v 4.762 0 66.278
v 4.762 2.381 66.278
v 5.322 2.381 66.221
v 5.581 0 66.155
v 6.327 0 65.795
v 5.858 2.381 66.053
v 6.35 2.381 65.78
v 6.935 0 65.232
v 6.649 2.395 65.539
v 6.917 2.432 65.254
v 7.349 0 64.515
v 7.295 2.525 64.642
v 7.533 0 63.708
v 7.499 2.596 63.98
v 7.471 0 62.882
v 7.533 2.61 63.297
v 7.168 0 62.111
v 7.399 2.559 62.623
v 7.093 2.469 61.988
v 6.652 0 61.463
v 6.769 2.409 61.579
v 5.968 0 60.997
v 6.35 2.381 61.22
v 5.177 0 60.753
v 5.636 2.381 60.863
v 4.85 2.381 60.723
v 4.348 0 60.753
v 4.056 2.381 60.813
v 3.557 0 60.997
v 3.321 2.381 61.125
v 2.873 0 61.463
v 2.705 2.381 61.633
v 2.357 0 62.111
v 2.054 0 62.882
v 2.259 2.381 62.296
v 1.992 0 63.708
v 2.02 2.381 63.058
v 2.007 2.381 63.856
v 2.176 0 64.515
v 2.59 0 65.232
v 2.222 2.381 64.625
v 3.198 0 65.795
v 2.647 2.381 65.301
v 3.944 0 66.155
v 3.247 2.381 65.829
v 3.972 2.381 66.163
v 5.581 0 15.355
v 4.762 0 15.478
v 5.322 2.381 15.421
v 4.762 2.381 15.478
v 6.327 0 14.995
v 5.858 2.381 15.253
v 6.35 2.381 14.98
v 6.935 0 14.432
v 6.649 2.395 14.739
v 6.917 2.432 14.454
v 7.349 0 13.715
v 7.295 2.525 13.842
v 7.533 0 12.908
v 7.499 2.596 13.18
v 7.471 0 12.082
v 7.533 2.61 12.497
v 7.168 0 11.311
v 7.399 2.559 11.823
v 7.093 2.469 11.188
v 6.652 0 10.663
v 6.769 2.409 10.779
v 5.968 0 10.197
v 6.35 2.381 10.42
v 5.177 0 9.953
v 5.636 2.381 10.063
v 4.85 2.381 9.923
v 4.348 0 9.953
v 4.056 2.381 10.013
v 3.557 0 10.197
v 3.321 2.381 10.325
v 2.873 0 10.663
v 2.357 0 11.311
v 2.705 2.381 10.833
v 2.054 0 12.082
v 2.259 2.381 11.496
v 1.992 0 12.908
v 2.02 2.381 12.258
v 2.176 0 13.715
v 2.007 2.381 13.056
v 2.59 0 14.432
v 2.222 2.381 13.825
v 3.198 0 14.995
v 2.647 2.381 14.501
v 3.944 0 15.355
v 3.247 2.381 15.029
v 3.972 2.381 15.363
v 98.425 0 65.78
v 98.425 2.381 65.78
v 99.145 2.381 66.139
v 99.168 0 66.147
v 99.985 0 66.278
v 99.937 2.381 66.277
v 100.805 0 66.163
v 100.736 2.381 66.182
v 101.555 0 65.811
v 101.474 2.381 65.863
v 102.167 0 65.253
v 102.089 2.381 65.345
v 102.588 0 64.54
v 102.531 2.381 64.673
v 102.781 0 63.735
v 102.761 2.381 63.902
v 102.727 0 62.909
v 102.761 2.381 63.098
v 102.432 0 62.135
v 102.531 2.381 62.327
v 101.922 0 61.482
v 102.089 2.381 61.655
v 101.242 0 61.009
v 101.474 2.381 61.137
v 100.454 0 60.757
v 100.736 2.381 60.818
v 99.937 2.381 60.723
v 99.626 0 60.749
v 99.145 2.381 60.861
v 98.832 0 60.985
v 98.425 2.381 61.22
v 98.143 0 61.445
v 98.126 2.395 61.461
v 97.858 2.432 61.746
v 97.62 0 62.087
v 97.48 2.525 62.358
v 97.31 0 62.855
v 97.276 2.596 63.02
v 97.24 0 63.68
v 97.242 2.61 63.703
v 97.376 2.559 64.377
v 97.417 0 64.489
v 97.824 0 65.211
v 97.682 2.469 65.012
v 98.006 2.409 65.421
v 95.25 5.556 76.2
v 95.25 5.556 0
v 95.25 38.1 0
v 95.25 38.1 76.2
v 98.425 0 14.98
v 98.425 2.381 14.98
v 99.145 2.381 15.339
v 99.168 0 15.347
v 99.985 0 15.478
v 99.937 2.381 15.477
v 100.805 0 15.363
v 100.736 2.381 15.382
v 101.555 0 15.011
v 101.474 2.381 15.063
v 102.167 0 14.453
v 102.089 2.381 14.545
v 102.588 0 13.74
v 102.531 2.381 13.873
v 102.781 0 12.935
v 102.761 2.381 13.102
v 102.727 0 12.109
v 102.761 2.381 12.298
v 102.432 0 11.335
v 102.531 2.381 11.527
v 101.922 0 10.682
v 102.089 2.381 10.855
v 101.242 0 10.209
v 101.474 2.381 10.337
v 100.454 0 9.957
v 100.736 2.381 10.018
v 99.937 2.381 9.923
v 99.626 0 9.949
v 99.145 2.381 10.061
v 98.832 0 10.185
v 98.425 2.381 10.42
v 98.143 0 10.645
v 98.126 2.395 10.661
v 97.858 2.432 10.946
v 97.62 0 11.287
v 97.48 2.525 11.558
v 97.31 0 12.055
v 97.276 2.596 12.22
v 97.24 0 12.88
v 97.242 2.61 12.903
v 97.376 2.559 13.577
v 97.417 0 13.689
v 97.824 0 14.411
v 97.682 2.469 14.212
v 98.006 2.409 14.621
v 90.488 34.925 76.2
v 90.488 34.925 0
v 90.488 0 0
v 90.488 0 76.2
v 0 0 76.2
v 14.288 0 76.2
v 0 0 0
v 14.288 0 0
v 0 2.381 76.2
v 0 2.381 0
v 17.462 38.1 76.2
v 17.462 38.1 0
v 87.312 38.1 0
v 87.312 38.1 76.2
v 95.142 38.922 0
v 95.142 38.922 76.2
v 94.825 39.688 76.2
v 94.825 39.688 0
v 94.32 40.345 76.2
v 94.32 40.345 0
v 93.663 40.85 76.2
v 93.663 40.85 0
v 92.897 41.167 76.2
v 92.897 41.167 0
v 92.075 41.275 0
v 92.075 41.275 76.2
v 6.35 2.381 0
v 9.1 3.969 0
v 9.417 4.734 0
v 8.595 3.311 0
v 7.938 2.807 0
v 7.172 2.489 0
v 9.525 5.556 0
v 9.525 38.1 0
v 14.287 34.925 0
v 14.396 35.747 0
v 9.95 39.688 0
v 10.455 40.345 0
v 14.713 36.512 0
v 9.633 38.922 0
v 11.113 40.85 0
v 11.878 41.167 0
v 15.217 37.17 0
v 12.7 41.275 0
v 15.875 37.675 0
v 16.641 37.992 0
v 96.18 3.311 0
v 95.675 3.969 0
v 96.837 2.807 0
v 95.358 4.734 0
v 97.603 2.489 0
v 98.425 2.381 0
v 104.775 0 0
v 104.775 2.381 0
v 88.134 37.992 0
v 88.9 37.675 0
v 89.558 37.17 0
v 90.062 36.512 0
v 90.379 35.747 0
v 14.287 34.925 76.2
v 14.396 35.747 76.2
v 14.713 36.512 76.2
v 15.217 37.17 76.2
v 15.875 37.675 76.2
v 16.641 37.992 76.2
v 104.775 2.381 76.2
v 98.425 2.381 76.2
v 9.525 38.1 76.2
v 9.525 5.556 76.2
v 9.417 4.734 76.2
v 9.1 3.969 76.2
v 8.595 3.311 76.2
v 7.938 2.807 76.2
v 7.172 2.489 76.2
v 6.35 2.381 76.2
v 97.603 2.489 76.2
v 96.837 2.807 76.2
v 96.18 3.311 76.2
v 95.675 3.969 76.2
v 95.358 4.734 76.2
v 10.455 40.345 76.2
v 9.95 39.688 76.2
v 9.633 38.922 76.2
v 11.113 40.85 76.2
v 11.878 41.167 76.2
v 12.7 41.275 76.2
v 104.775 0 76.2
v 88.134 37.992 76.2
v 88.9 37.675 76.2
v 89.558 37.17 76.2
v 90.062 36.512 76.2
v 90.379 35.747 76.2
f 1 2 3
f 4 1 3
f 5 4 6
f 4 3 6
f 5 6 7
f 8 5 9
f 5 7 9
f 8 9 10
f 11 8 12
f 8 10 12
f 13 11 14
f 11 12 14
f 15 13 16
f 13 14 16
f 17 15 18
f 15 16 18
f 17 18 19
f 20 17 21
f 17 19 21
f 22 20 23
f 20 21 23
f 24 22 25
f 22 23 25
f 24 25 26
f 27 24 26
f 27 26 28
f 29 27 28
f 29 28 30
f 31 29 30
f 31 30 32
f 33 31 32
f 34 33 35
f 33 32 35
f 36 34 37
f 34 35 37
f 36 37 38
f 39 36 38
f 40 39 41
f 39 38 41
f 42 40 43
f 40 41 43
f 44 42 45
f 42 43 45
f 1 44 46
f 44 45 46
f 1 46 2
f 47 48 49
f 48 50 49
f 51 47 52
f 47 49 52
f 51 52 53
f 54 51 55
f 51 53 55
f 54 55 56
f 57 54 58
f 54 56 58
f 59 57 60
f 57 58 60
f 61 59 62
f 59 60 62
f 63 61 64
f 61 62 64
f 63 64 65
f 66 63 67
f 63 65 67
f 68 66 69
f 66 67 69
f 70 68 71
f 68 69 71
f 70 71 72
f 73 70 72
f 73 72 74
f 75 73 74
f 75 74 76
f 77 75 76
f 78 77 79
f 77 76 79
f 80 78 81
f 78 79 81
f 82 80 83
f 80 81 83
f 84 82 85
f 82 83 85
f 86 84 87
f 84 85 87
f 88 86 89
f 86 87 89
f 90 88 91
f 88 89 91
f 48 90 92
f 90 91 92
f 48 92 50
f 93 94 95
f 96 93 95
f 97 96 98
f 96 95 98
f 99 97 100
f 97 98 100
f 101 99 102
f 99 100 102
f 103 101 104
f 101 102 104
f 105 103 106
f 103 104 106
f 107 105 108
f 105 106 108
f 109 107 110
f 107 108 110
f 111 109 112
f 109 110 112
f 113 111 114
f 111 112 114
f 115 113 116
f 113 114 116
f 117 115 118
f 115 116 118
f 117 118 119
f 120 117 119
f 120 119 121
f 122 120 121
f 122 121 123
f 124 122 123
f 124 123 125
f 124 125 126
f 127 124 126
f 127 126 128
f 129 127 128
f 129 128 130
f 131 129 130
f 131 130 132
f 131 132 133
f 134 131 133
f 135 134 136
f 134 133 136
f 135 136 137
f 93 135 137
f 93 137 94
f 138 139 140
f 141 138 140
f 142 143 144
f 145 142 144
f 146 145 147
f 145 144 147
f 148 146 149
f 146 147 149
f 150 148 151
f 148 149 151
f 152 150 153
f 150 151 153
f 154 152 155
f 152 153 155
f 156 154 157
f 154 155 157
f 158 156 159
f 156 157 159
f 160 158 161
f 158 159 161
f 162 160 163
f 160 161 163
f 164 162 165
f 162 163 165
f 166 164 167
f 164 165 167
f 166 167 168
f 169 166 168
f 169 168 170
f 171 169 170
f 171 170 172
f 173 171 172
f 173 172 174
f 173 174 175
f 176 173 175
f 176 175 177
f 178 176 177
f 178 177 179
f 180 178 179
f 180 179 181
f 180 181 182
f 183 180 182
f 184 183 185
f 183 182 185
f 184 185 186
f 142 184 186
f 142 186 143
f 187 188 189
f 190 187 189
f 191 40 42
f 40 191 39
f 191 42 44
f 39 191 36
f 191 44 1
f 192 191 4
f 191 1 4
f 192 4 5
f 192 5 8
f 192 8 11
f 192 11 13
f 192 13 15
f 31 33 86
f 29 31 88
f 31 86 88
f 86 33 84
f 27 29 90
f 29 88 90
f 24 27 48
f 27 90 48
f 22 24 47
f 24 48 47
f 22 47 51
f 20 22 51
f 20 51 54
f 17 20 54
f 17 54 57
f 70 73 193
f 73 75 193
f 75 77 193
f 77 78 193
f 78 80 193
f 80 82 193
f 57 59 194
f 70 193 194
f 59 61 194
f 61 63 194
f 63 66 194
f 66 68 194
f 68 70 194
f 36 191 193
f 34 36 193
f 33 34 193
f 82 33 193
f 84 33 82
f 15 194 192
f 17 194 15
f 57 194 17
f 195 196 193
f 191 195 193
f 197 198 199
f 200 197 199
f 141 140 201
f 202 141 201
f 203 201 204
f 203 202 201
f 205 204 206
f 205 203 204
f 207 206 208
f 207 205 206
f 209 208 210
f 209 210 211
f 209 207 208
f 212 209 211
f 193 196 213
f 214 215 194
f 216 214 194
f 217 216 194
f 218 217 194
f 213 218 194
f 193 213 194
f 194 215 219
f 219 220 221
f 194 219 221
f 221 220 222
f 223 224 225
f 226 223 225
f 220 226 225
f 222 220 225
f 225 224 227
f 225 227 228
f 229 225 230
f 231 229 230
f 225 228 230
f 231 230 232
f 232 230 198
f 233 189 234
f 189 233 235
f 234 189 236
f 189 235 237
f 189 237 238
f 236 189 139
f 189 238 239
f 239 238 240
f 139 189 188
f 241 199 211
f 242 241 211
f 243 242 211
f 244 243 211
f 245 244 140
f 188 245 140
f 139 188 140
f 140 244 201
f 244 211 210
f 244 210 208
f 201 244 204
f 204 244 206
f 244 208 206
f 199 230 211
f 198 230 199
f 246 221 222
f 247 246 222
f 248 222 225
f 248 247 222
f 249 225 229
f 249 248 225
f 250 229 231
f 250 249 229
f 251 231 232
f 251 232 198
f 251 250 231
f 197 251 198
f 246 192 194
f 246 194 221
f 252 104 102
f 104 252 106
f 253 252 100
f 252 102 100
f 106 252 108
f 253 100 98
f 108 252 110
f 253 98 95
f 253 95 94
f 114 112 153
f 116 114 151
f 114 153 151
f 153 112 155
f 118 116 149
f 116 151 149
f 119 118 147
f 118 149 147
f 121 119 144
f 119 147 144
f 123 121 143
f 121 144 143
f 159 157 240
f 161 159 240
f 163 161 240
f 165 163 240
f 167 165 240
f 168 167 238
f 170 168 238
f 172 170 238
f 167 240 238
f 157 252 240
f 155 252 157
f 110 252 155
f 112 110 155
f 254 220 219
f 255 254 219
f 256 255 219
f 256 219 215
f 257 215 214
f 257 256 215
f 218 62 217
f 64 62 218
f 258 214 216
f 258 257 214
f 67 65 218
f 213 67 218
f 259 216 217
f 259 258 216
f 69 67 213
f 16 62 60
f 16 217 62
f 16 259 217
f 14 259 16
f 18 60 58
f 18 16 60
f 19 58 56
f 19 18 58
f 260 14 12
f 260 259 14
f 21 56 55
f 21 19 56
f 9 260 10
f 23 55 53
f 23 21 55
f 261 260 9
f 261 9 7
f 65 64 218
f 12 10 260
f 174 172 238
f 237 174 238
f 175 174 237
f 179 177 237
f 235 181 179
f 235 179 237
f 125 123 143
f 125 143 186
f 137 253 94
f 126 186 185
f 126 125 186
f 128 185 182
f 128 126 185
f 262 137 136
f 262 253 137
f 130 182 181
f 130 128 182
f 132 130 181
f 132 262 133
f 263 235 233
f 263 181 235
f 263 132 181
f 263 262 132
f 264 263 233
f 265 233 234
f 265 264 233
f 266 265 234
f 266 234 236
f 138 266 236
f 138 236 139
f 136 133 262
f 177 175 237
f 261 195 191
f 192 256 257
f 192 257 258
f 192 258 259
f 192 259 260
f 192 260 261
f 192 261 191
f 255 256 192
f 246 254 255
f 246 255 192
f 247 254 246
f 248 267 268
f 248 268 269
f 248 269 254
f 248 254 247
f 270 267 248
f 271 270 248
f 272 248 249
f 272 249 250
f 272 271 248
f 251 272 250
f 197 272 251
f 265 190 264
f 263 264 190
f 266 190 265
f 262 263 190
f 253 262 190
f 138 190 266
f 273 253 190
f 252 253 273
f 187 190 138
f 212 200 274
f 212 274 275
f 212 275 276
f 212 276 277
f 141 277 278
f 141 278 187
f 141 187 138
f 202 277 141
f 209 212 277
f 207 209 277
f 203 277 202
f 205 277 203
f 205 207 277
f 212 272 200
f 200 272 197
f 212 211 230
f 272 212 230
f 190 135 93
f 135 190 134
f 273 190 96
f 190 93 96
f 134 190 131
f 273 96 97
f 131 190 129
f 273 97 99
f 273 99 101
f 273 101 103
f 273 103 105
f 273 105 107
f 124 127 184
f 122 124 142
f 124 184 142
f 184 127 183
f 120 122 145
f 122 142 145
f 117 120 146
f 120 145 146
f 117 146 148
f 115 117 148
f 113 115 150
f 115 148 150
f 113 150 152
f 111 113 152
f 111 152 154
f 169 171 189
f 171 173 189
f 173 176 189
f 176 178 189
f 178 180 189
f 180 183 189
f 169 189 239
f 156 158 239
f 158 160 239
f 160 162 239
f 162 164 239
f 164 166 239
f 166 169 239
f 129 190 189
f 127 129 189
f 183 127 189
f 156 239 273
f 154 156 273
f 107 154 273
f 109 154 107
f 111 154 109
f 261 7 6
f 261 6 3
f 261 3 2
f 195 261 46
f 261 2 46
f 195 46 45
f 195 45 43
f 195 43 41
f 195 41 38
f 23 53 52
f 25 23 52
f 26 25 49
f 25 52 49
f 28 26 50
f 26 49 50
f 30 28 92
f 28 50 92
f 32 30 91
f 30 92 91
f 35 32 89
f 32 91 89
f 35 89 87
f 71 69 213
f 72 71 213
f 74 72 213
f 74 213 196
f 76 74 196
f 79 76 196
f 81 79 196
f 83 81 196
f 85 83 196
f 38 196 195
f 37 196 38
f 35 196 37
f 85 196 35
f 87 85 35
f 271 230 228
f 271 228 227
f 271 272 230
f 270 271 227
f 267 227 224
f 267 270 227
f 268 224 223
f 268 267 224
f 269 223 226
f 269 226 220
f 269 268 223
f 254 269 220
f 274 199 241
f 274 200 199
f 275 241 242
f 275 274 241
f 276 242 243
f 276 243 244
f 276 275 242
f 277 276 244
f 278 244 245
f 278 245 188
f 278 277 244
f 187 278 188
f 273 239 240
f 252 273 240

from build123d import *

# Parameters (mm, degrees)
BOSS_EXTRUDE1_DEPTH = 76.2
FILLET1_R           = 3.175
SKETCH4_R           = 2.778125
CUT_EXTRUDE1_DEPTH  = 6.35


with BuildPart() as part:
    # Sketch1 → Boss-Extrude1 (new body)
    with BuildSketch(Plane.XY):
        Polygon((0, 0), (14.2875, 0), (14.2875, 38.1), (90.4875, 38.1), (90.4875, 0), (104.775, 0), (104.775, 2.38125), (95.25, 2.38125), (95.25, 41.275), (9.525, 41.275), (9.525, 2.38125), (0, 2.38125), align=None)
    extrude(amount=BOSS_EXTRUDE1_DEPTH)

    # Fillet1
    fillet1_edges = [part.edges().sort_by_distance(p)[0] for p in [
        (9.525, 2.38125, 38.1),
        (9.525, 41.275, 38.1),
        (95.25, 41.275, 38.1),
        (95.25, 2.38125, 38.1),
        (90.4875, 38.1, 38.1),
        (14.2875, 38.1, 38.1),
    ]]
    fillet(fillet1_edges, radius=FILLET1_R)

    # Sketch4 → Cut-Extrude1 (cut, symmetric)
    with BuildSketch(Plane(origin=(0, 2.38125, 0), x_dir=(1, 0, 0), z_dir=(0, 1, 0))):
        with Locations(Location((100.0125, -12.7, 0), (0, 0, 235.150095421))):
            Circle(SKETCH4_R)
        with Locations(Location((100.0125, -63.5, 0), (0, 0, 235.150095421))):
            Circle(SKETCH4_R)
        with Locations(Location((4.7625, -63.5, 0), (0, 0, 270))):
            Circle(SKETCH4_R)
        with Locations(Location((4.7625, -12.7, 0), (0, 0, 270))):
            Circle(SKETCH4_R)
    extrude(amount=CUT_EXTRUDE1_DEPTH, both=True, mode=Mode.SUBTRACT)


solid = part.part
